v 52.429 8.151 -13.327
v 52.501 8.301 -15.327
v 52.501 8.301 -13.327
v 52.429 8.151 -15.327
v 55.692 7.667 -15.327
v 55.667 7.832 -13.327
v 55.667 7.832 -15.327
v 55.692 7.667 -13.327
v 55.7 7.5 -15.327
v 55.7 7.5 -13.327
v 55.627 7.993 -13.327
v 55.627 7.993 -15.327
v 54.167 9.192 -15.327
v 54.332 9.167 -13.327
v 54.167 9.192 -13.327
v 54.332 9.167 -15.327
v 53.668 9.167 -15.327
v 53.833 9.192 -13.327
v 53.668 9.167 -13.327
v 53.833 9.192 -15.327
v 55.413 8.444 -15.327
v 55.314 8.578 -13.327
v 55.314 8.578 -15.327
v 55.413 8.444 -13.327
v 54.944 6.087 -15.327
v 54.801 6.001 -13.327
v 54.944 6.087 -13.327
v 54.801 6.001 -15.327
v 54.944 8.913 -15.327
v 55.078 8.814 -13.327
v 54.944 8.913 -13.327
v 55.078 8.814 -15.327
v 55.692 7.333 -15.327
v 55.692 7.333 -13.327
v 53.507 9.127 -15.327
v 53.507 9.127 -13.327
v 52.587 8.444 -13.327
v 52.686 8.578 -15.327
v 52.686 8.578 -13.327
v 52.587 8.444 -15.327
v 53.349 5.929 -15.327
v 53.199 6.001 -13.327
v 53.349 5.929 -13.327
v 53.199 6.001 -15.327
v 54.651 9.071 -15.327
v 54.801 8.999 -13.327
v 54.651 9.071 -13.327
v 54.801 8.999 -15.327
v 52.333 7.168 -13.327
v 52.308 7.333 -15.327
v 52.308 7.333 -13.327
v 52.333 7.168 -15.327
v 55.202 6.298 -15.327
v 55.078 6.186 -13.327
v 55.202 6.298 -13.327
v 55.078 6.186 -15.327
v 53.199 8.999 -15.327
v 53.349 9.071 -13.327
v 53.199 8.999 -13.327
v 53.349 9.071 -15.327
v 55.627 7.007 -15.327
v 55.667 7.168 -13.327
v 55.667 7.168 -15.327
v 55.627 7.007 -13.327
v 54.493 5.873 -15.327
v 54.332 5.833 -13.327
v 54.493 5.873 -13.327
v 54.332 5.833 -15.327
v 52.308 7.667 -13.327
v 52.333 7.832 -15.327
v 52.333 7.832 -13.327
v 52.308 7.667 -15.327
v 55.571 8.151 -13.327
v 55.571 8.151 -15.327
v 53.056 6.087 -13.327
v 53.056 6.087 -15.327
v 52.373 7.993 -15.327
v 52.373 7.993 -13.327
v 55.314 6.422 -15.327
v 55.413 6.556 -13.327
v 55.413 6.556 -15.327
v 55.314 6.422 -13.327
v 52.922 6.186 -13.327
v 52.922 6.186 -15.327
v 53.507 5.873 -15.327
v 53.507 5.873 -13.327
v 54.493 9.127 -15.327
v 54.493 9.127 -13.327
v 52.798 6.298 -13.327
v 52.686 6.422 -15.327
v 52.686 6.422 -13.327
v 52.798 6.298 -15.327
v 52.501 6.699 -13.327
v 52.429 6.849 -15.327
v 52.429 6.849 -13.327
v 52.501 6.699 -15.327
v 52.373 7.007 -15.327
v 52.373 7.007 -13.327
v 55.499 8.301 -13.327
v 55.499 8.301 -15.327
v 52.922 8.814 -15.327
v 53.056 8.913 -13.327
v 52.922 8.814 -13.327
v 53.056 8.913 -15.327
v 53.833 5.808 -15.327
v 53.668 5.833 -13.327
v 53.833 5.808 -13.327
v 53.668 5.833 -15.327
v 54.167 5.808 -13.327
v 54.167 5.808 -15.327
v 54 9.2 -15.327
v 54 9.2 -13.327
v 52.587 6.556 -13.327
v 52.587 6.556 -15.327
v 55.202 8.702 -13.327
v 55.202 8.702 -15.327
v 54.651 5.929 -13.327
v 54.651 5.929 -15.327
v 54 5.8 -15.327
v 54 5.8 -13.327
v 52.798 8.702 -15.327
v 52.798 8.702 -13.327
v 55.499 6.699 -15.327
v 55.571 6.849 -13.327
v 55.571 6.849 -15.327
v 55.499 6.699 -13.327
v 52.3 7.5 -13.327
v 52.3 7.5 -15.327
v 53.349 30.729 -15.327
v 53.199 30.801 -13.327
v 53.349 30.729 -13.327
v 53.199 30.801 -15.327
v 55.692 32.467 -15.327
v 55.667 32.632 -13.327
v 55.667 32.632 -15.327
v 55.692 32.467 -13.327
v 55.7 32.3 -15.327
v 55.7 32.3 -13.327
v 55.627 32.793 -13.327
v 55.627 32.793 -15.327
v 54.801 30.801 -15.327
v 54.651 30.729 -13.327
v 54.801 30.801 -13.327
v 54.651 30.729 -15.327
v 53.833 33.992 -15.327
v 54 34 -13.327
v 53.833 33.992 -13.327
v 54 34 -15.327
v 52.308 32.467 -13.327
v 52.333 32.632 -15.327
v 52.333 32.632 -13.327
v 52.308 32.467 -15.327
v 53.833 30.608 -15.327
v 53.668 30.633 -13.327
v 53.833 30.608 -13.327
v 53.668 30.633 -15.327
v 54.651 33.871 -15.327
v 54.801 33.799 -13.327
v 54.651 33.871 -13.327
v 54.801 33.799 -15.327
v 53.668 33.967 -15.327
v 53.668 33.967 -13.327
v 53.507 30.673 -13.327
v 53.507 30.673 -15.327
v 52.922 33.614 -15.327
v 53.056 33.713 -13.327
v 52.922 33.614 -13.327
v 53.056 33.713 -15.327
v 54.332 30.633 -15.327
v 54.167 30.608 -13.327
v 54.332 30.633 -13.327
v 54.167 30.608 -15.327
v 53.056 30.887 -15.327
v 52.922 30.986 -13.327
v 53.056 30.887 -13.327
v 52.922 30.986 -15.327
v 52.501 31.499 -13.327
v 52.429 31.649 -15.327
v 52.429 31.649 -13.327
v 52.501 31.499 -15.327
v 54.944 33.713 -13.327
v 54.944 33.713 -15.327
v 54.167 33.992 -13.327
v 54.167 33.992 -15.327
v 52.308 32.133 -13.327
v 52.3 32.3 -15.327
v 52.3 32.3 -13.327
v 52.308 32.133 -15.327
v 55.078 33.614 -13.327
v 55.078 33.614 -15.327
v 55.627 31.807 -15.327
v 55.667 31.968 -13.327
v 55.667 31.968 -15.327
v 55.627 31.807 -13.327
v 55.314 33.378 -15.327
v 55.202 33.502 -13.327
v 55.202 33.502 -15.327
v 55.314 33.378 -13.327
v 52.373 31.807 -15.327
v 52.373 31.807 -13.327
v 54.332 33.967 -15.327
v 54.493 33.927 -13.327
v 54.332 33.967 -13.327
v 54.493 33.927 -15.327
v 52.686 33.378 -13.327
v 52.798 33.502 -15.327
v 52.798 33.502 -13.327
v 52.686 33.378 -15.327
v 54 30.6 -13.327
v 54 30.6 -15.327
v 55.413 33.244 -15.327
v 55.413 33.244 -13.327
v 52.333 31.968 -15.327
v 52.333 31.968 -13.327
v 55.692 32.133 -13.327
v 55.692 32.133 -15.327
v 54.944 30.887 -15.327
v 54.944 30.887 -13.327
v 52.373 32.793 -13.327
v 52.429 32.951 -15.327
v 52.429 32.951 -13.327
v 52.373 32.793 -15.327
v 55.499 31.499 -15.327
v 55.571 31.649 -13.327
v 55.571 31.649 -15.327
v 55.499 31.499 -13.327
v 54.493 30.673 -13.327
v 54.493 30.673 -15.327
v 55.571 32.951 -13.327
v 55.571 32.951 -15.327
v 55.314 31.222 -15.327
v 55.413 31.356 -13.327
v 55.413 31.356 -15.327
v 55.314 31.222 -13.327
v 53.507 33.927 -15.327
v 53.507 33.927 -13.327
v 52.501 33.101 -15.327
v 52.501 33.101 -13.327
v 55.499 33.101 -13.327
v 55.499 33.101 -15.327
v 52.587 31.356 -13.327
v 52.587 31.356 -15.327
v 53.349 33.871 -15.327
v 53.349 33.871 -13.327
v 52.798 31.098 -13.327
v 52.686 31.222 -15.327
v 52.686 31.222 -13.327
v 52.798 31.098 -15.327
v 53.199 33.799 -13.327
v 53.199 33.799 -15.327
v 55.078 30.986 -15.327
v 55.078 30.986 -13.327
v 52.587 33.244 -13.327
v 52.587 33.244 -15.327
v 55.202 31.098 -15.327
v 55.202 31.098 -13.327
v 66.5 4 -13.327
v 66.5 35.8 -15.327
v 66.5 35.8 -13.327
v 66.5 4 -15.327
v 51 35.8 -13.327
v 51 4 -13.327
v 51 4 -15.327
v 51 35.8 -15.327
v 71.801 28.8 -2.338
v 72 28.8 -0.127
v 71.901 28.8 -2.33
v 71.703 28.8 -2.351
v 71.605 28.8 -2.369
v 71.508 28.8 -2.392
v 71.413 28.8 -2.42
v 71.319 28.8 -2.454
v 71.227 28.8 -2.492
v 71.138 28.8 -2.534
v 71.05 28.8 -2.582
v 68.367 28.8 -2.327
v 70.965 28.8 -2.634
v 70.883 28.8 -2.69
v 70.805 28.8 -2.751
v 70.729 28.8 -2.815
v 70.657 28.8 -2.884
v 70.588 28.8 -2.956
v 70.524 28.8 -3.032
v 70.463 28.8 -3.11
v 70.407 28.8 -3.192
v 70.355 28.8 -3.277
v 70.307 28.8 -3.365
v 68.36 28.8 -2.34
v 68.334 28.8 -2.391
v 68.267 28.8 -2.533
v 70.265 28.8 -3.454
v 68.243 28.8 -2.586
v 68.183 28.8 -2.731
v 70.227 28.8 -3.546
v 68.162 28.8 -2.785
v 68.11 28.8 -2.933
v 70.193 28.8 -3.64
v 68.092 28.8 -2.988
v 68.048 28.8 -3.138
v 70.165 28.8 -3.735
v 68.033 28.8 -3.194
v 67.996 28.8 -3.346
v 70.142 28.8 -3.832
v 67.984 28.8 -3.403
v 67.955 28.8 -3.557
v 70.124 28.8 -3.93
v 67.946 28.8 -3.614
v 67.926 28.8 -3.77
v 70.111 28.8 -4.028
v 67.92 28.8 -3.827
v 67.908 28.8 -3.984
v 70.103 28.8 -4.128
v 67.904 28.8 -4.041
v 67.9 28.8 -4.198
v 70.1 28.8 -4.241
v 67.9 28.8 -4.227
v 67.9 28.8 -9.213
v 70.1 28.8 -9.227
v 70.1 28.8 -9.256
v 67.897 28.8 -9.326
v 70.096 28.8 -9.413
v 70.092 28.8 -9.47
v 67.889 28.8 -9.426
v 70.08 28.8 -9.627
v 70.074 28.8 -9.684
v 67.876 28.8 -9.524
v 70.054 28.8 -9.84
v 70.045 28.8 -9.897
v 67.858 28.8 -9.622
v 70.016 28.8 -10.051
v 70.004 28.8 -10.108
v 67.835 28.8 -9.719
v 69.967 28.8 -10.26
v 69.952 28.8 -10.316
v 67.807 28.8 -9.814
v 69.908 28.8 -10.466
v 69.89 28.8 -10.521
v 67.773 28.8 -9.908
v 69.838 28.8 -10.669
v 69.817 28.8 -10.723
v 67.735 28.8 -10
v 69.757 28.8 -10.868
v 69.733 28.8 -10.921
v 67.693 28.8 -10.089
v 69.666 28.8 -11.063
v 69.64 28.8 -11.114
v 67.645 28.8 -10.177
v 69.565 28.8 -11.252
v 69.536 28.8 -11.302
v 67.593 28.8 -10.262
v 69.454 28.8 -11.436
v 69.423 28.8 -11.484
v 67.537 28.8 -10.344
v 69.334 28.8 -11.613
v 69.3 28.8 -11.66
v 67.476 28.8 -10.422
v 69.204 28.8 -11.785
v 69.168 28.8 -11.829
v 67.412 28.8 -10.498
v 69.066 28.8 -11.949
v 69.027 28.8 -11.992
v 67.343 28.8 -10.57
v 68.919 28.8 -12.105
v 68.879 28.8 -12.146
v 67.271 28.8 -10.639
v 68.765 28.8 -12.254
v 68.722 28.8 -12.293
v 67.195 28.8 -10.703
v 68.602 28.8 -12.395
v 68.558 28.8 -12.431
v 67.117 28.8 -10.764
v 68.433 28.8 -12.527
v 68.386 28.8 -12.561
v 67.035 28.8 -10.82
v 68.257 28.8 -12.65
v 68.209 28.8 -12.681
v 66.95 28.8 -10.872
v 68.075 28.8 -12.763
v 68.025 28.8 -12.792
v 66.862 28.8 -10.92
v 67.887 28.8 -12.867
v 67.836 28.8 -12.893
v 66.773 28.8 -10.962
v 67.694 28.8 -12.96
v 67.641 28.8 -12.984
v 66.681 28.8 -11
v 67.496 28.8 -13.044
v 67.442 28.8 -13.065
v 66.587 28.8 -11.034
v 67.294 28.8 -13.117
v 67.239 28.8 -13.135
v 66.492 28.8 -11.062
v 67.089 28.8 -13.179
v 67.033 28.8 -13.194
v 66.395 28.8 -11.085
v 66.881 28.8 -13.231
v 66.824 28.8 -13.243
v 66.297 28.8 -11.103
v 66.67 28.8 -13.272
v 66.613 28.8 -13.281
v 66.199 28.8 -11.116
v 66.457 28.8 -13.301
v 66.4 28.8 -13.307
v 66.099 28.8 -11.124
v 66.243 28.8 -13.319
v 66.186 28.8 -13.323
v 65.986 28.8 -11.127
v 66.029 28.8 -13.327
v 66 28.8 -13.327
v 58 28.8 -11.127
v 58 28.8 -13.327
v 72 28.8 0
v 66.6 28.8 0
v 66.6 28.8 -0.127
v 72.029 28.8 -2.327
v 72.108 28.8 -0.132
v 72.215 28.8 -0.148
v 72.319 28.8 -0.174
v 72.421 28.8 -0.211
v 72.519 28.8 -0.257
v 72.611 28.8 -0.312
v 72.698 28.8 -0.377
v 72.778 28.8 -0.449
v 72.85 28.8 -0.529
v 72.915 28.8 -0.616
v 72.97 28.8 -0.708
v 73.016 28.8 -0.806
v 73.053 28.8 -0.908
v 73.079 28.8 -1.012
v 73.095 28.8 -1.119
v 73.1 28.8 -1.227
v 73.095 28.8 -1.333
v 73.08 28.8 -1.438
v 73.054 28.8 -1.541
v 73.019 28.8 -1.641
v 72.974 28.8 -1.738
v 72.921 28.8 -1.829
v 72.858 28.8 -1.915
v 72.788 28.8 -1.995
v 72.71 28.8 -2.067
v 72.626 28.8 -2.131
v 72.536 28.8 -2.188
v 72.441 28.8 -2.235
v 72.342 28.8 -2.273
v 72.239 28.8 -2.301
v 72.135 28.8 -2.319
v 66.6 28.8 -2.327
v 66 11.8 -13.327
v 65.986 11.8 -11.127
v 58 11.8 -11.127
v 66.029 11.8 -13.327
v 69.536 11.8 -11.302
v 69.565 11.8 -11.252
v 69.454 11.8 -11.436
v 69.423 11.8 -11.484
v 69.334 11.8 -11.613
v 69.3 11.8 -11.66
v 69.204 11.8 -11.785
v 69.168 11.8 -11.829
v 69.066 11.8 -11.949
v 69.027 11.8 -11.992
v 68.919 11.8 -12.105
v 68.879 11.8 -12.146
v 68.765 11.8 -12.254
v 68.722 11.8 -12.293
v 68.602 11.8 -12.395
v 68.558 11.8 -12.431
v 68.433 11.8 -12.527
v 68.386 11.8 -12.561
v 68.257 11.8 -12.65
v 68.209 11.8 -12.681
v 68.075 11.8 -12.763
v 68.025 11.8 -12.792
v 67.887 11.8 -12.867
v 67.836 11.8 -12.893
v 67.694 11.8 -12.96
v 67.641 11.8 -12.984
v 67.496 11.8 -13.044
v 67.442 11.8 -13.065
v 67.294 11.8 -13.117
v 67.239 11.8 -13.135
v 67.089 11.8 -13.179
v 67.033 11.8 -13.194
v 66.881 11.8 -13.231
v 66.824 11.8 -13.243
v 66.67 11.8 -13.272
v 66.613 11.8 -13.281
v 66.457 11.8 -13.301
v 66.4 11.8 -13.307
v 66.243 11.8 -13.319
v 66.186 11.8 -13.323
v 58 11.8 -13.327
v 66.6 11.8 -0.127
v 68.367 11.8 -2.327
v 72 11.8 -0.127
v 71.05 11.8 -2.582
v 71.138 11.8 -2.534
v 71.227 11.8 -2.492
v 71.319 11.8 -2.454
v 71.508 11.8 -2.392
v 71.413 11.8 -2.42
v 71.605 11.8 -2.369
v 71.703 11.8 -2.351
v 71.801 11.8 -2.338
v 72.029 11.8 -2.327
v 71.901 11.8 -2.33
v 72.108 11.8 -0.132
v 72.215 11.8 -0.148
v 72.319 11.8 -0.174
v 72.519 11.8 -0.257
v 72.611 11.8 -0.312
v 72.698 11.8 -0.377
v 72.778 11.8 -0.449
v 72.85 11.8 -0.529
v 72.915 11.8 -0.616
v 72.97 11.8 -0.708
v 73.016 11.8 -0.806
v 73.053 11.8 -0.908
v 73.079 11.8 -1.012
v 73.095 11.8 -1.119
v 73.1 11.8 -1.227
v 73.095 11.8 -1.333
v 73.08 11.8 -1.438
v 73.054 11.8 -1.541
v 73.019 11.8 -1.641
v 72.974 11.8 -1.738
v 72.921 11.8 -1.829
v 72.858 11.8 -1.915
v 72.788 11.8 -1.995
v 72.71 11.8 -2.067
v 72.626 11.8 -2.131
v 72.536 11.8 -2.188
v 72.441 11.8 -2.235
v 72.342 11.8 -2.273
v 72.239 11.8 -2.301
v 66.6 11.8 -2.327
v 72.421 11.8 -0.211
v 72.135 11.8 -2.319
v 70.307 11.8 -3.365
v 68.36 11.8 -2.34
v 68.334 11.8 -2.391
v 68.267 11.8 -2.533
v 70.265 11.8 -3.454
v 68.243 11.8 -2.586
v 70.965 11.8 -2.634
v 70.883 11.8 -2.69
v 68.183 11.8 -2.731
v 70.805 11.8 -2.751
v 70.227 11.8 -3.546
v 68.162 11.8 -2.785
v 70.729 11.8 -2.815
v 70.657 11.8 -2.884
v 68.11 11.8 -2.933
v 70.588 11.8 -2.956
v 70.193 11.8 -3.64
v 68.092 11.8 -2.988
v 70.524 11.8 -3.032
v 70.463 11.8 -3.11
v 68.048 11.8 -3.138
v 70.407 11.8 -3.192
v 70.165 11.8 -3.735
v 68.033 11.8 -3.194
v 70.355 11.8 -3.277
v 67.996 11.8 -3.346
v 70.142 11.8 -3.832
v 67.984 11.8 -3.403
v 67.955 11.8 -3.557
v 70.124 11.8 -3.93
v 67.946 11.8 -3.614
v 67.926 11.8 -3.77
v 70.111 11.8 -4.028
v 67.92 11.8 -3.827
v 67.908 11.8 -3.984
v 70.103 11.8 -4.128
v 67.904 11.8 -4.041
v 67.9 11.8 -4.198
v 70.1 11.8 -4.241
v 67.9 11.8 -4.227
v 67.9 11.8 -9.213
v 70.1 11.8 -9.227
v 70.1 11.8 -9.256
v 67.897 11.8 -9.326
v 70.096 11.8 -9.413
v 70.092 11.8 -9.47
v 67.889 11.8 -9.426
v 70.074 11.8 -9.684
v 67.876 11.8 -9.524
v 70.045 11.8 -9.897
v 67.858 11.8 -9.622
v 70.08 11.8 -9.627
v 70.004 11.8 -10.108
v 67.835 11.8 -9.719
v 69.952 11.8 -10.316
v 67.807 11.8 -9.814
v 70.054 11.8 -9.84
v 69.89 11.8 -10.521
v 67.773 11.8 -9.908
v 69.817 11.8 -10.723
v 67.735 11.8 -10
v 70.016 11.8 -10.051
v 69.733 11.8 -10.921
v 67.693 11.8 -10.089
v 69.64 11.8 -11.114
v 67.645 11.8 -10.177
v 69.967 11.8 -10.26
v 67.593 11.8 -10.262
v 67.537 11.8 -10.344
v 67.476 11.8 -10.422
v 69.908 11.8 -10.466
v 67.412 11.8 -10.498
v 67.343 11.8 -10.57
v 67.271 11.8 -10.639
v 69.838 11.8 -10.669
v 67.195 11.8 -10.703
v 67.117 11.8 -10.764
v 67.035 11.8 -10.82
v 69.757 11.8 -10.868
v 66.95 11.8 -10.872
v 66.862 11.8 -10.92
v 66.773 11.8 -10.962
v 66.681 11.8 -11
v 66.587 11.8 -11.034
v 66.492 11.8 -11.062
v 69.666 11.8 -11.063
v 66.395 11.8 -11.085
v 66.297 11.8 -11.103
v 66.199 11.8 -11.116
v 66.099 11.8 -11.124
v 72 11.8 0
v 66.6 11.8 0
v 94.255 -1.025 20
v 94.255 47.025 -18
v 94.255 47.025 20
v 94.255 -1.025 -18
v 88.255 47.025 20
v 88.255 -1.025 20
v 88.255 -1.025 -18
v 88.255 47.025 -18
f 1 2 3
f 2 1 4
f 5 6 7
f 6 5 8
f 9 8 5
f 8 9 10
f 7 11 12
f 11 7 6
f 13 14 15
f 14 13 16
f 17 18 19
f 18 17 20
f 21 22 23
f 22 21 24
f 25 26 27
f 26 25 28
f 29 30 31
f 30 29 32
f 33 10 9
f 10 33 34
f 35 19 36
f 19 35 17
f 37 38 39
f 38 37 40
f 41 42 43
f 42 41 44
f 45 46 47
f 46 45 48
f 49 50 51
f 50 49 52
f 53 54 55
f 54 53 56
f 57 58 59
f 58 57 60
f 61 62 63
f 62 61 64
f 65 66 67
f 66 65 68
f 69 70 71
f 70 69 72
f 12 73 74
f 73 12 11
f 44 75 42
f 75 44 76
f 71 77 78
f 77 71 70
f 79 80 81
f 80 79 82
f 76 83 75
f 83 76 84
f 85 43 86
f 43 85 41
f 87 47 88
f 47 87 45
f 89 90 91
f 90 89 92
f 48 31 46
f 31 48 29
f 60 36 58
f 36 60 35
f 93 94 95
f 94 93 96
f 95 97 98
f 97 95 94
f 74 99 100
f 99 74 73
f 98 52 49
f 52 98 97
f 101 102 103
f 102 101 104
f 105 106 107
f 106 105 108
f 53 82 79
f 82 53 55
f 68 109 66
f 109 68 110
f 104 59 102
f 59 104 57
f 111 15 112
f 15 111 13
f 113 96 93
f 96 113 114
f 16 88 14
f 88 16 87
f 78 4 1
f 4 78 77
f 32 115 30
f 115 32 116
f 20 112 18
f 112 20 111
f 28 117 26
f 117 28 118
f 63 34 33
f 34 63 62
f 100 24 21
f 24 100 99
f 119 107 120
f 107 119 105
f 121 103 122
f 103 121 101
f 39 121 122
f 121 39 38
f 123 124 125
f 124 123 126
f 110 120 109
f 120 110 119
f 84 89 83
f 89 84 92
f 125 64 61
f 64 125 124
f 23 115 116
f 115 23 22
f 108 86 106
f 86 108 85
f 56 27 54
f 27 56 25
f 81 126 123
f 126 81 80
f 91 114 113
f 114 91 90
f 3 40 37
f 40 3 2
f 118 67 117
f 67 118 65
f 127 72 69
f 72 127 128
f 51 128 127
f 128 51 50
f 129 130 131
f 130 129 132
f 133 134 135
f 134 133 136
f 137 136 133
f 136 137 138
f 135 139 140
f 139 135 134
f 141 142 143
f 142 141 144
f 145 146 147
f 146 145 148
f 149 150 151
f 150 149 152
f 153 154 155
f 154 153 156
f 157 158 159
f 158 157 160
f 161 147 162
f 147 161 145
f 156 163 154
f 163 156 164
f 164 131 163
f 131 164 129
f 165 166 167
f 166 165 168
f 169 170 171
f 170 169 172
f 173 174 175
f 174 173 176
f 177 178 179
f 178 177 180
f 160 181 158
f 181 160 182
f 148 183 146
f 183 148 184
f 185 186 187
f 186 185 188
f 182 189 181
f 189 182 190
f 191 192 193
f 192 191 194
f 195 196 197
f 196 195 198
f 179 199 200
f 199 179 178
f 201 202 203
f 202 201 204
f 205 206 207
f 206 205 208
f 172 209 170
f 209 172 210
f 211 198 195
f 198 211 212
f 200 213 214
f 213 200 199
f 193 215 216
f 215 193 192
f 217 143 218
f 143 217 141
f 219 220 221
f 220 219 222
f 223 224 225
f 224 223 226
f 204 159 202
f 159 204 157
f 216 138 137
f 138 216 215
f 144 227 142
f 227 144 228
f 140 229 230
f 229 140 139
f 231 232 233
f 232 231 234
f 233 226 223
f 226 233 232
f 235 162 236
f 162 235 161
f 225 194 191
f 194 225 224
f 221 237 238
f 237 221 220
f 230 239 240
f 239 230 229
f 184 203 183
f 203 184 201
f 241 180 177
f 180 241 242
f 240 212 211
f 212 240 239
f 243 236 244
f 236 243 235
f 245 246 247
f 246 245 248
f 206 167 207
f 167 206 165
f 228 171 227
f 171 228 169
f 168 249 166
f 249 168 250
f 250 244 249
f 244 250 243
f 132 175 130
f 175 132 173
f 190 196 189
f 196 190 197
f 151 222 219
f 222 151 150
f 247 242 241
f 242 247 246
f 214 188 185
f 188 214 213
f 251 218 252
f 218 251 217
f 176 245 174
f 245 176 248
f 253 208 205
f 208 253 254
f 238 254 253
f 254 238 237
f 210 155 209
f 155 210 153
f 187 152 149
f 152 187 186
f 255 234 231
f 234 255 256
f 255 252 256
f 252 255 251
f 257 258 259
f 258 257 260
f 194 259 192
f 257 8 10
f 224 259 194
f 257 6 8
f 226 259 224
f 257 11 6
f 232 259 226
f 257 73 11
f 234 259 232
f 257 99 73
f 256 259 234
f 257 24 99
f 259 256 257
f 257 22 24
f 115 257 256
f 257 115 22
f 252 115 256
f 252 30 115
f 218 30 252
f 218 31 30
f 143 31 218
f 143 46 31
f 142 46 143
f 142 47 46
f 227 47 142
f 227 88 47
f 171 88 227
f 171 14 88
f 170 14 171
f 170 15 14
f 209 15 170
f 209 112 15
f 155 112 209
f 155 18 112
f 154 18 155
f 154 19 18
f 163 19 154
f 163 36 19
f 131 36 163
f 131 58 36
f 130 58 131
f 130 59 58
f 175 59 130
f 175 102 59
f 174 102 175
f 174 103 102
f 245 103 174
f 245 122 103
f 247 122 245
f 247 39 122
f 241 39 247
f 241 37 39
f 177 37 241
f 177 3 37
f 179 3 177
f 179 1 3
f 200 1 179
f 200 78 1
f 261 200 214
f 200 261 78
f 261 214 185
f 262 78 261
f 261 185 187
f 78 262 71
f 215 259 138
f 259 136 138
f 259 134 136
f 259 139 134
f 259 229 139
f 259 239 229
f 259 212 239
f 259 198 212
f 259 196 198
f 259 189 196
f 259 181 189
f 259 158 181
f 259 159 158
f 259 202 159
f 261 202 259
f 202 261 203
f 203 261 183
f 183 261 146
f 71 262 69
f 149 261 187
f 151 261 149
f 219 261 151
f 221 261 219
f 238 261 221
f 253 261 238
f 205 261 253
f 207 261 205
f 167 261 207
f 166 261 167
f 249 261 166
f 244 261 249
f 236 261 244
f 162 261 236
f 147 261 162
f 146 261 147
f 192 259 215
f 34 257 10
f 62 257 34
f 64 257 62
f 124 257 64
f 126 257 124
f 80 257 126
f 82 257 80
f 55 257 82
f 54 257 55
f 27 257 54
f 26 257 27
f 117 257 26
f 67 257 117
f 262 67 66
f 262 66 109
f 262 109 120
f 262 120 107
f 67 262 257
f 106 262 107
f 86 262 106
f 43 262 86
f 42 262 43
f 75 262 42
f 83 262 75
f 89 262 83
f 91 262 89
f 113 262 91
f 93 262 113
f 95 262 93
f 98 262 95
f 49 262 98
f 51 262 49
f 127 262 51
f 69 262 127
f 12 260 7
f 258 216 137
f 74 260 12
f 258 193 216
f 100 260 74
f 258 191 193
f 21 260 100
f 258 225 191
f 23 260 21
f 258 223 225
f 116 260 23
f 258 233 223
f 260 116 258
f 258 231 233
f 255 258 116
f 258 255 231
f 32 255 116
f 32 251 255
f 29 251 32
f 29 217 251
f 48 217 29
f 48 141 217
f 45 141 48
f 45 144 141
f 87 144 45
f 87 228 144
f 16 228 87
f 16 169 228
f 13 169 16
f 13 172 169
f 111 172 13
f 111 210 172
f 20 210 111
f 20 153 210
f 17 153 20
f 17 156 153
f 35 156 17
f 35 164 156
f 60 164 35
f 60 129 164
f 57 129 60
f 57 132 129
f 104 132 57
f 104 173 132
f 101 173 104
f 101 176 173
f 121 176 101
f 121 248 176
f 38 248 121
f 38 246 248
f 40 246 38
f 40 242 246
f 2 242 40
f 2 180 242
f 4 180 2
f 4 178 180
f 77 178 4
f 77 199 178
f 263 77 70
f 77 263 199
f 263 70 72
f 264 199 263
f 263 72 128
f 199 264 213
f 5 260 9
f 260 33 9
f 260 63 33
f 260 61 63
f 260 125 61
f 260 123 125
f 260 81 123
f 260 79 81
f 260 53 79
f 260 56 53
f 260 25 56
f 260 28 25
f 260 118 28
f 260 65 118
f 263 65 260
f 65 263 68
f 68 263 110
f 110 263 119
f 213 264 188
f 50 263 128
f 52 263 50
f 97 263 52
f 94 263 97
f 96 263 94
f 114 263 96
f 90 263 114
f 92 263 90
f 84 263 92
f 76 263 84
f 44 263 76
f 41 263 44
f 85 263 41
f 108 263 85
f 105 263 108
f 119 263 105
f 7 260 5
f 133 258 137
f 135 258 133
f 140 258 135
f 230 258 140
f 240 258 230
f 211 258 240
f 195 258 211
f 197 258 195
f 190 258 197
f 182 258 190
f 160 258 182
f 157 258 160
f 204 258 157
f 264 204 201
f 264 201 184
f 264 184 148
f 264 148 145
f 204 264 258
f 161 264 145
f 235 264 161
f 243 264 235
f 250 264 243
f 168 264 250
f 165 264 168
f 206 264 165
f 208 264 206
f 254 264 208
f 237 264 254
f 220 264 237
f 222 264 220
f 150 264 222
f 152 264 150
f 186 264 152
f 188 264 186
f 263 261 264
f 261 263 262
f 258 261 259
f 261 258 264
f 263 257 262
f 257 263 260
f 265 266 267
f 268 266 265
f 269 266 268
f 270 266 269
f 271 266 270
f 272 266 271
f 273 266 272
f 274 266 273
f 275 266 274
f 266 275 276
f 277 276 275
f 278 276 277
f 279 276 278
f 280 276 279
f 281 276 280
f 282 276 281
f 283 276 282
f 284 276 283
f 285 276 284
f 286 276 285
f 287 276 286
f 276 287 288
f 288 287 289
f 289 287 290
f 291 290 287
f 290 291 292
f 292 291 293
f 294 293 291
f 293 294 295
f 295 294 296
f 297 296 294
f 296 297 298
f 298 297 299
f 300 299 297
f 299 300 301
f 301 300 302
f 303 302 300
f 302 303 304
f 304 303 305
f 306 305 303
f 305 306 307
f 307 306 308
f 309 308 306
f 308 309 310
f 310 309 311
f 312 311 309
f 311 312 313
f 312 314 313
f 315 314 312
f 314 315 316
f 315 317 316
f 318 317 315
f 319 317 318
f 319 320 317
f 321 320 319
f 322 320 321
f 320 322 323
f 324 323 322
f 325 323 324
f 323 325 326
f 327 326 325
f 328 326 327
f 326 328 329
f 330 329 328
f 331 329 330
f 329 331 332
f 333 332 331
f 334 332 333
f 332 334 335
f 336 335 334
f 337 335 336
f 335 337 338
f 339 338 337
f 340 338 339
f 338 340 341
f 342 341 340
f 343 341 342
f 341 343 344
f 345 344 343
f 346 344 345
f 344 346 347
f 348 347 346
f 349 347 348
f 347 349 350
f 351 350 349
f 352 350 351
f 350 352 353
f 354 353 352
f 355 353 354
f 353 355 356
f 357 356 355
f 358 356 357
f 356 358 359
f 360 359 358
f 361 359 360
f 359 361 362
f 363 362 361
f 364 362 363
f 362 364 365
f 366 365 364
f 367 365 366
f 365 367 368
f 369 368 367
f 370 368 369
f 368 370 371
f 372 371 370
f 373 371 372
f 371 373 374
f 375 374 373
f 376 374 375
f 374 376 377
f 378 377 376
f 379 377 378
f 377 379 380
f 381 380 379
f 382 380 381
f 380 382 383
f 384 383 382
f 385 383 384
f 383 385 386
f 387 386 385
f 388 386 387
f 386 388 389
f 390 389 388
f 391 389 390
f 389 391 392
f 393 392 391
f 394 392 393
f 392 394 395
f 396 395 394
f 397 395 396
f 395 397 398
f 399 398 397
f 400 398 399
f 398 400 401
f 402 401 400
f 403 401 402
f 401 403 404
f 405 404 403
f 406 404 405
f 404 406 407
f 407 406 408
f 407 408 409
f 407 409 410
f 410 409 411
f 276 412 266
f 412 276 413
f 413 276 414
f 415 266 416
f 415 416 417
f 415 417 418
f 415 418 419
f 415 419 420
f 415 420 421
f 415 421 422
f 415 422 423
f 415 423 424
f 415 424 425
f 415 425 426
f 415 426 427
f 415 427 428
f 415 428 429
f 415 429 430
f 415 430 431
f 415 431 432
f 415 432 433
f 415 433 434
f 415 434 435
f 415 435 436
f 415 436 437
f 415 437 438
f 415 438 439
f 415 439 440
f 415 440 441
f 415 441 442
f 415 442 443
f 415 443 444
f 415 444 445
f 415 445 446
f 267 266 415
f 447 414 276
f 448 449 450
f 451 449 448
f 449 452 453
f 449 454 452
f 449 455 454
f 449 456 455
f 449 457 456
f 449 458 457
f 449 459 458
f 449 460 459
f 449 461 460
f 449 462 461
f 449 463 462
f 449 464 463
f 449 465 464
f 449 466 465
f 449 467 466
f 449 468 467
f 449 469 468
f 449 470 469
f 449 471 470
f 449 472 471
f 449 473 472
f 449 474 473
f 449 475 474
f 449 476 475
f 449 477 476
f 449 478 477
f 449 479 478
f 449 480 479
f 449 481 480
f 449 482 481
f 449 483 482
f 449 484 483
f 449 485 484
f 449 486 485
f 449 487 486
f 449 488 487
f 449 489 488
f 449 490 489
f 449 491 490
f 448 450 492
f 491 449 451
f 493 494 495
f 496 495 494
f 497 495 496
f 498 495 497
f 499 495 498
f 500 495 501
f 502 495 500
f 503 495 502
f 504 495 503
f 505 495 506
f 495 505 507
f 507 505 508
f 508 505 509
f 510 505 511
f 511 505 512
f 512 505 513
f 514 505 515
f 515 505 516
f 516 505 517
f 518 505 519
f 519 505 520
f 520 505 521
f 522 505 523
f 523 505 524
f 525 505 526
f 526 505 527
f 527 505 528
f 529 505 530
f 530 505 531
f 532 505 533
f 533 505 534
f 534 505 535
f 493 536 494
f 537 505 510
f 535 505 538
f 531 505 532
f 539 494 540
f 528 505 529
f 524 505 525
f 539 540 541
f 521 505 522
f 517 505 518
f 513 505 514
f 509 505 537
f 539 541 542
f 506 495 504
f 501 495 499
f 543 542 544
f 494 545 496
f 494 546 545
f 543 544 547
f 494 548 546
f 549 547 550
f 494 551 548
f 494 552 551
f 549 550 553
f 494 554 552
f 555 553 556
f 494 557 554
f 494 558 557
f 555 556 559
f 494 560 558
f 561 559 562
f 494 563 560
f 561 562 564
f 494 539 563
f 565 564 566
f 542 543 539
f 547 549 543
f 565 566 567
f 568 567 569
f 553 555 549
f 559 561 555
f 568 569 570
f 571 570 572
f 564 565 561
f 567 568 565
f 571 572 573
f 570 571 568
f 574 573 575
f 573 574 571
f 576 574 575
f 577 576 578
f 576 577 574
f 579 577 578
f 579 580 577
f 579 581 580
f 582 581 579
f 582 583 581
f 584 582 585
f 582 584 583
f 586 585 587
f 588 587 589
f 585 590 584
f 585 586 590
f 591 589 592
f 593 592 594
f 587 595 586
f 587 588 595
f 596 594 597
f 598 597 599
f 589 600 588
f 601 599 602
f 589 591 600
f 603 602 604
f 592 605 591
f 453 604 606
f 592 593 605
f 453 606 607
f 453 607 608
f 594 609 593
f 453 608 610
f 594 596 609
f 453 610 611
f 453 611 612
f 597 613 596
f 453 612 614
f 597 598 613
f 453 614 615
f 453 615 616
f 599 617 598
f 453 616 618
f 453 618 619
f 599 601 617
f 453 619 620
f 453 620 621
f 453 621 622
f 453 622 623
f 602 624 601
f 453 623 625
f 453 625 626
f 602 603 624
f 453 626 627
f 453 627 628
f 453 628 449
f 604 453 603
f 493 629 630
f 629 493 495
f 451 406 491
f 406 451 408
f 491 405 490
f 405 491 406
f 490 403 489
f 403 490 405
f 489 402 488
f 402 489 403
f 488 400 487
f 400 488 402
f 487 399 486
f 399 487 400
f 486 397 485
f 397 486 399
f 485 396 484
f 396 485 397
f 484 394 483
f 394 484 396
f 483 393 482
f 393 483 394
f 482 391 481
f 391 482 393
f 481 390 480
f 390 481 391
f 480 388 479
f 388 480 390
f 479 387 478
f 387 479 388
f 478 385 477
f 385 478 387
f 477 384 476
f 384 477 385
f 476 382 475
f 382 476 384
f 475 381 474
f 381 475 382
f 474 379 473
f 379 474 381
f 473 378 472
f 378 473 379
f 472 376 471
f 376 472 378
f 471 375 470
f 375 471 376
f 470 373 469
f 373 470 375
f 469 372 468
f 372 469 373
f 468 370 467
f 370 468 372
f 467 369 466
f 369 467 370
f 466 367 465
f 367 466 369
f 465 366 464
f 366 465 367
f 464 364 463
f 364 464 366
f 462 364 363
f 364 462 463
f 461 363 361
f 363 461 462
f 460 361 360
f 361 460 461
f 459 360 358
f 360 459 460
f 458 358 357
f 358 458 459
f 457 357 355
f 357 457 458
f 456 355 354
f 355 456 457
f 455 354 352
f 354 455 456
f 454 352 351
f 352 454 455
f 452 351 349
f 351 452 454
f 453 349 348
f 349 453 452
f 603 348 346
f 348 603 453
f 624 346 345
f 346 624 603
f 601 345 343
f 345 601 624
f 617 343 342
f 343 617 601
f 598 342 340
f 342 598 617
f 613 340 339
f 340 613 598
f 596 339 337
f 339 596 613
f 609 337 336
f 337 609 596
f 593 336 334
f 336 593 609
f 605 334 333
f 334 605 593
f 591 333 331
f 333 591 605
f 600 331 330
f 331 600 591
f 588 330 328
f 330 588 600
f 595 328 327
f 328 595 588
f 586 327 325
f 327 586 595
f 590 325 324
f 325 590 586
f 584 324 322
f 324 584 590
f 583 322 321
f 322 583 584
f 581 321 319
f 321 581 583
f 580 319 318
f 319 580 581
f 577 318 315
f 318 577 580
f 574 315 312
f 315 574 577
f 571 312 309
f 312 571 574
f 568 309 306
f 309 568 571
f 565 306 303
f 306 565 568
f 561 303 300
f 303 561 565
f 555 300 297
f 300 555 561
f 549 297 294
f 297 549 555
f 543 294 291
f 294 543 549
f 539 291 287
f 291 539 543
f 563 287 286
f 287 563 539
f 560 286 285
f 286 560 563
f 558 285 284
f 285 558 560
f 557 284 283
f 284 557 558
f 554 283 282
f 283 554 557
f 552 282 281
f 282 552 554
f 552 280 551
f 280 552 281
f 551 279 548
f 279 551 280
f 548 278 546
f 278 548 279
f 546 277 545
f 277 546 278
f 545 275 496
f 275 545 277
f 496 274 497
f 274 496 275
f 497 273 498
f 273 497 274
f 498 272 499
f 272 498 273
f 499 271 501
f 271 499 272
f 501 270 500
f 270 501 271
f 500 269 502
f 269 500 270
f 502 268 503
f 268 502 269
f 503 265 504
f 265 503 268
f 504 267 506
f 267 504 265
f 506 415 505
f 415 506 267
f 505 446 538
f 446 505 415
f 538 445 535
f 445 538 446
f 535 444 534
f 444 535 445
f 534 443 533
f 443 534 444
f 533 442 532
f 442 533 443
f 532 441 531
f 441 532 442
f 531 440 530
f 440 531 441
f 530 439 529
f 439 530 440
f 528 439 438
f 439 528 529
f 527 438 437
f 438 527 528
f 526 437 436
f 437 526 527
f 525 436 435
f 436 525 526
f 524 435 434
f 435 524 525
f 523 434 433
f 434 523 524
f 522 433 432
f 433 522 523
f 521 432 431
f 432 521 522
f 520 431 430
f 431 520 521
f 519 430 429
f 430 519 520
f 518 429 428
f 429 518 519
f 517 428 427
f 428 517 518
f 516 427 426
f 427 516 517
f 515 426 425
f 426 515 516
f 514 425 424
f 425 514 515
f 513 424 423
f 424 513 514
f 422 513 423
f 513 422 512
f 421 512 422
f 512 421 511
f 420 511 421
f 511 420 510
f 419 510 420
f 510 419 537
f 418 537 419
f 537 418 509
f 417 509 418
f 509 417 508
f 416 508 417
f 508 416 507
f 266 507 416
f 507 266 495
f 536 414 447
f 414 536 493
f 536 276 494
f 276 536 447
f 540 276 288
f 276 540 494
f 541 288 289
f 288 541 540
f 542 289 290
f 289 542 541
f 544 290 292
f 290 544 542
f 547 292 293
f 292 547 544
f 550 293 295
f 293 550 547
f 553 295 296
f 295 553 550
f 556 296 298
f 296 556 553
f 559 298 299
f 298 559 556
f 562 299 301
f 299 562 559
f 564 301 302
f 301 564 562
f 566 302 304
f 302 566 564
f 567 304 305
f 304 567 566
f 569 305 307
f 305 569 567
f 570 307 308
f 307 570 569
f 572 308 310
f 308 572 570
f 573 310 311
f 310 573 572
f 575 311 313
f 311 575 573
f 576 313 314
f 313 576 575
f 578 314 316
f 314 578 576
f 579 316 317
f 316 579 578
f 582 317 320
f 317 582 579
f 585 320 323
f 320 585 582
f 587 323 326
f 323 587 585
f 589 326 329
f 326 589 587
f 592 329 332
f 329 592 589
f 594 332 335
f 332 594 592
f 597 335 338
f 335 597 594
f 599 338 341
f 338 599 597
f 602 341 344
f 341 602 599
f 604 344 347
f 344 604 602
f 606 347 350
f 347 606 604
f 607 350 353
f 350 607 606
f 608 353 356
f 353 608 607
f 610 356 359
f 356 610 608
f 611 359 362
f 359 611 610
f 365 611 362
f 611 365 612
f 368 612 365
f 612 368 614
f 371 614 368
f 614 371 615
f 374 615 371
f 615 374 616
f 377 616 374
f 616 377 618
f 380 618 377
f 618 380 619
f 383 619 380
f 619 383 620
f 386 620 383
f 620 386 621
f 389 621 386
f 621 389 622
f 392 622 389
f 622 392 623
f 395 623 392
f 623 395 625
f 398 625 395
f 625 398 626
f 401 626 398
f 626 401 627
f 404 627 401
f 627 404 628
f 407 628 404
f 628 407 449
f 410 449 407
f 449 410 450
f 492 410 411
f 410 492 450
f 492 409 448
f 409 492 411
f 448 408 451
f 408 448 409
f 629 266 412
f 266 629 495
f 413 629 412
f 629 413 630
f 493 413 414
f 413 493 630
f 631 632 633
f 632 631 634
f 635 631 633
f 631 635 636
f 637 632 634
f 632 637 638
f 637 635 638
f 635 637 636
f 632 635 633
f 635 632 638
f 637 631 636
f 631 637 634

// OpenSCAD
// T01 thermal correction candidate, PCB bottomZ0. Package/copper heat-flow execution gate remains.
$fn=64;
// Copper packet is a volume envelope only:40 unbonded C110 laminae, each0.050..0.055mm.
module foil_packet(){translate([0,28.8,0])rotate([90,0,0])linear_extrude(17)polygon(points=[[68.36742356920699, -2.327], [66.6, -2.327], [66.6, -0.127], [72.0, -0.127], [72.10781885436252, -0.13229680066058358], [72.21459935421774, -0.14813619155644653], [72.31931314497992, -0.17436563069457023], [72.4209517756016, -0.21073251423758466], [72.5185364105086, -0.2568866092168096], [72.61112725632157, -0.3123834264672003], [72.69783261258002, -0.3766885013009893], [72.7778174593052, -0.4491825406947978], [72.85031149869901, -0.52916738741999], [72.9146165735328, -0.6158727436784377], [72.9701133907832, -0.7084635894914025], [73.01626748576241, -0.8060482243984013], [73.05263436930542, -0.9076868550200916], [73.07886380844356, -1.012400645782259], [73.09470319933942, -1.1191811456374834], [73.1, -1.227], [73.09487815202365, -1.3330275069087165], [73.07956030505223, -1.438067637868891], [73.05418910578301, -1.5411422118219895], [73.01900082226263, -1.6412913518625305], [72.97432314365243, -1.7375824240446052], [72.92057212863925, -1.8291187224896746], [72.85824833090943, -1.9150478199160048], [72.78793213776713, -1.994569505825846], [72.71027836530604, -2.066943238426374], [72.62601016046679, -2.1314950408887503], [72.53591226676653, -2.187623777724227], [72.44082371641346, -2.234806752828848], [72.34163001686069, -2.2726045770652346], [72.23925490456152, -2.300665260052341], [72.13465174271914, -2.3187274880585806], [72.02879464313867, -2.326623057473113], [71.90058141754851, -2.32998043894255], [71.80143533452095, -2.3377834049017934], [71.70283350343949, -2.350764582230358], [71.60504618506926, -2.3688883904235123], [71.5083414076529, -2.3921051533827487], [71.41298423226331, -2.420351235574614], [71.31923602629023, -2.4535492164511146], [71.22735374704972, -2.4916081026542893], [71.13758923748254, -2.534423577422475], [71.05018853586998, -2.581878286515418], [70.96539120145998, -2.6338421598740327], [70.88342965785215, -2.69017276813329], [70.8045285559402, -2.750715713011612], [70.72890415816008, -2.8153050505054087], [70.6567637457299, -2.883763745729839], [70.58830505050534, -2.955904158160167], [70.52371571301163, -3.031528555940172], [70.4631727681333, -3.1104296578521233], [70.40684215987407, -3.1923912014599107], [70.35487828651533, -3.2771885358701187], [70.30742357742251, -3.3645892374824644], [70.26460810265428, -3.454353747049748], [70.22654921645118, -3.5462360262900696], [70.19335123557458, -3.639984232263409], [70.16510515338277, -3.735341407652838], [70.1418883904235, -3.8320461850692933], [70.12376458223035, -3.9298335034395655], [70.11078340490178, -4.028435334520958], [70.10298043894254, -4.127581417548563], [70.1, -4.241399788793378], [70.1, -9.227], [70.09962305747311, -9.25579464313863], [70.09551166173684, -9.412802511867461], [70.09249767137017, -9.470312874029457], [70.08017475321127, -9.626890395103587], [70.07415503361601, -9.684164201245066], [70.0536543692966, -9.839882206562798], [70.04464542010577, -9.896762473162042], [70.01602320052177, -10.051194150494627], [70.00404971463885, -10.107524972694822], [69.96738439130463, -10.260247035549106], [69.95247918722222, -10.315874014481835], [69.90787125724049, -10.466467862299114], [69.89007518908686, -10.521238528281998], [69.837646919693, -10.669291393793058], [69.81700876525404, -10.723055624237448], [69.75690385869025, -10.868161704828948], [69.73348018571265, -10.920772135716533], [69.66586338534995, -11.062533705707772], [69.63971839649325, -11.113846135504243], [69.56477503528146, -11.251874636285603], [69.53598039214282, -11.301748421187552], [69.45391588462577, -11.435665526232635], [69.4225505113205, -11.483963965662385], [69.33358979060907, -11.613402617494723], [69.2997396574452, -11.659993328787014], [69.20412655869127, -11.784598745059107], [69.16788444653096, -11.829354026312698], [69.06588103859224, -11.948784672239759], [69.0273462845457, -11.991581852339715], [68.91923215167316, -12.105510376822783], [68.87851037682276, -12.146232151673171], [68.76458185233969, -12.254346284545711], [68.72178467223976, -12.292881038592228], [68.6023540263127, -12.394884446530959], [68.55759874505911, -12.431126558691263], [68.43299332878702, -12.526739657445193], [68.38640261749475, -12.560589790609049], [68.25696396566242, -12.649550511320477], [68.20866552623262, -12.680915884625781], [68.07474842118754, -12.762980392142826], [68.02487463628556, -12.79177503528148], [67.8868461355042, -12.866718396493267], [67.83553370570775, -12.892863385349957], [67.6937721357165, -12.960480185712656], [67.64116170482902, -12.983903858690207], [67.49605562423753, -13.04400876525401], [67.44229139379304, -13.064646919693004], [67.29423852828198, -13.11707518908686], [67.23946786229916, -13.134871257240471], [67.08887401448189, -13.179479187222215], [67.03324703554904, -13.194384391304654], [66.88052497269474, -13.231049714638866], [66.82419415049463, -13.243023200521767], [66.66976247316205, -13.271645420105763], [66.61288220656276, -13.280654369296604], [66.45716420124504, -13.301155033616011], [66.3998903951036, -13.30717475321126], [66.24331287402946, -13.319497671370163], [66.18580251186748, -13.322511661736836], [66.02879464313865, -13.326623057473114], [66.0, -13.327], [58.0, -13.327], [58.0, -11.127], [65.98560021120666, -11.127], [66.09941858245152, -11.12401956105745], [66.198564665479, -11.116216595098212], [66.29716649656054, -11.103235417769637], [66.39495381493076, -11.085111609576485], [66.49165859234711, -11.061894846617248], [66.58701576773667, -11.033648764425392], [66.68076397370979, -11.000450783548882], [66.77264625295031, -10.962391897345704], [66.8624107625175, -10.919576422577503], [66.94981146412995, -10.87212171348463], [67.03460879853999, -10.820157840125988], [67.11657034214791, -10.763827231866665], [67.19547144405982, -10.703284286988378], [67.27109584183987, -10.638694949494633], [67.34323625427007, -10.570236254270185], [67.41169494949473, -10.49809584183977], [67.47628428698836, -10.422471444059855], [67.5368272318667, -10.343570342147883], [67.59315784012593, -10.26160879854008], [67.64512171348467, -10.176811464129878], [67.69257642257753, -10.089410762517462], [67.73539189734565, -9.99964625295044], [67.77345078354887, -9.907763973709809], [67.8066487644254, -9.814015767736626], [67.83489484661723, -9.718658592347161], [67.8581116095765, -9.621953814930702], [67.87623541776965, -9.524166496560431], [67.88921659509822, -9.425564665479046], [67.89701956105746, -9.326418582451439], [67.9, -9.212600211206624], [67.9, -4.227], [67.90037694252689, -4.19820535686137], [67.90448833826316, -4.041197488132539], [67.90750232862983, -3.983687125970544], [67.91982524678873, -3.827109604896414], [67.92584496638399, -3.7698357987549334], [67.9463456307034, -3.6141177934372015], [67.95535457989423, -3.5572375268379597], [67.98397679947823, -3.402805849505375], [67.99595028536115, -3.346475027305181], [68.03261560869537, -3.193752964450896], [68.04752081277778, -3.1381259855181667], [68.09212874275951, -2.9875321377008874], [68.10992481091314, -2.9327614717179973], [68.162353080307, -2.784708606206939], [68.182991234746, -2.730944375762471], [68.2430961413098, -2.58583829517097], [68.26651981428732, -2.53322786428355], [68.33413661465, -2.391466294292311], [68.36028160350675, -2.340153864495755], [68.36742356920699, -2.327]]);}
color([.8,.4,.1])foil_packet();
//8805 insulating adhesive plus existing PCB soldermask; copper shall never touch live copper/vias.
color([1,1,1,.6])translate([66.6,11.8,-.127])cube([5.4,17,.127]);
//Chassis landing:mechanically attached to vehicle heat path; two M3 holes are below the PCB.
color("silver")difference(){translate([51,4,-15.327])cube([15.5,31.8,2]);for(y=[7.5,32.3])translate([54,y,-16])cylinder(d=3.4,h=4);}
//Dashed/transparent view envelopes are not additional hardware.
color([1,0,0,.08])translate([88.254766,-1.025,-18])cube([6,48.05,38]);
